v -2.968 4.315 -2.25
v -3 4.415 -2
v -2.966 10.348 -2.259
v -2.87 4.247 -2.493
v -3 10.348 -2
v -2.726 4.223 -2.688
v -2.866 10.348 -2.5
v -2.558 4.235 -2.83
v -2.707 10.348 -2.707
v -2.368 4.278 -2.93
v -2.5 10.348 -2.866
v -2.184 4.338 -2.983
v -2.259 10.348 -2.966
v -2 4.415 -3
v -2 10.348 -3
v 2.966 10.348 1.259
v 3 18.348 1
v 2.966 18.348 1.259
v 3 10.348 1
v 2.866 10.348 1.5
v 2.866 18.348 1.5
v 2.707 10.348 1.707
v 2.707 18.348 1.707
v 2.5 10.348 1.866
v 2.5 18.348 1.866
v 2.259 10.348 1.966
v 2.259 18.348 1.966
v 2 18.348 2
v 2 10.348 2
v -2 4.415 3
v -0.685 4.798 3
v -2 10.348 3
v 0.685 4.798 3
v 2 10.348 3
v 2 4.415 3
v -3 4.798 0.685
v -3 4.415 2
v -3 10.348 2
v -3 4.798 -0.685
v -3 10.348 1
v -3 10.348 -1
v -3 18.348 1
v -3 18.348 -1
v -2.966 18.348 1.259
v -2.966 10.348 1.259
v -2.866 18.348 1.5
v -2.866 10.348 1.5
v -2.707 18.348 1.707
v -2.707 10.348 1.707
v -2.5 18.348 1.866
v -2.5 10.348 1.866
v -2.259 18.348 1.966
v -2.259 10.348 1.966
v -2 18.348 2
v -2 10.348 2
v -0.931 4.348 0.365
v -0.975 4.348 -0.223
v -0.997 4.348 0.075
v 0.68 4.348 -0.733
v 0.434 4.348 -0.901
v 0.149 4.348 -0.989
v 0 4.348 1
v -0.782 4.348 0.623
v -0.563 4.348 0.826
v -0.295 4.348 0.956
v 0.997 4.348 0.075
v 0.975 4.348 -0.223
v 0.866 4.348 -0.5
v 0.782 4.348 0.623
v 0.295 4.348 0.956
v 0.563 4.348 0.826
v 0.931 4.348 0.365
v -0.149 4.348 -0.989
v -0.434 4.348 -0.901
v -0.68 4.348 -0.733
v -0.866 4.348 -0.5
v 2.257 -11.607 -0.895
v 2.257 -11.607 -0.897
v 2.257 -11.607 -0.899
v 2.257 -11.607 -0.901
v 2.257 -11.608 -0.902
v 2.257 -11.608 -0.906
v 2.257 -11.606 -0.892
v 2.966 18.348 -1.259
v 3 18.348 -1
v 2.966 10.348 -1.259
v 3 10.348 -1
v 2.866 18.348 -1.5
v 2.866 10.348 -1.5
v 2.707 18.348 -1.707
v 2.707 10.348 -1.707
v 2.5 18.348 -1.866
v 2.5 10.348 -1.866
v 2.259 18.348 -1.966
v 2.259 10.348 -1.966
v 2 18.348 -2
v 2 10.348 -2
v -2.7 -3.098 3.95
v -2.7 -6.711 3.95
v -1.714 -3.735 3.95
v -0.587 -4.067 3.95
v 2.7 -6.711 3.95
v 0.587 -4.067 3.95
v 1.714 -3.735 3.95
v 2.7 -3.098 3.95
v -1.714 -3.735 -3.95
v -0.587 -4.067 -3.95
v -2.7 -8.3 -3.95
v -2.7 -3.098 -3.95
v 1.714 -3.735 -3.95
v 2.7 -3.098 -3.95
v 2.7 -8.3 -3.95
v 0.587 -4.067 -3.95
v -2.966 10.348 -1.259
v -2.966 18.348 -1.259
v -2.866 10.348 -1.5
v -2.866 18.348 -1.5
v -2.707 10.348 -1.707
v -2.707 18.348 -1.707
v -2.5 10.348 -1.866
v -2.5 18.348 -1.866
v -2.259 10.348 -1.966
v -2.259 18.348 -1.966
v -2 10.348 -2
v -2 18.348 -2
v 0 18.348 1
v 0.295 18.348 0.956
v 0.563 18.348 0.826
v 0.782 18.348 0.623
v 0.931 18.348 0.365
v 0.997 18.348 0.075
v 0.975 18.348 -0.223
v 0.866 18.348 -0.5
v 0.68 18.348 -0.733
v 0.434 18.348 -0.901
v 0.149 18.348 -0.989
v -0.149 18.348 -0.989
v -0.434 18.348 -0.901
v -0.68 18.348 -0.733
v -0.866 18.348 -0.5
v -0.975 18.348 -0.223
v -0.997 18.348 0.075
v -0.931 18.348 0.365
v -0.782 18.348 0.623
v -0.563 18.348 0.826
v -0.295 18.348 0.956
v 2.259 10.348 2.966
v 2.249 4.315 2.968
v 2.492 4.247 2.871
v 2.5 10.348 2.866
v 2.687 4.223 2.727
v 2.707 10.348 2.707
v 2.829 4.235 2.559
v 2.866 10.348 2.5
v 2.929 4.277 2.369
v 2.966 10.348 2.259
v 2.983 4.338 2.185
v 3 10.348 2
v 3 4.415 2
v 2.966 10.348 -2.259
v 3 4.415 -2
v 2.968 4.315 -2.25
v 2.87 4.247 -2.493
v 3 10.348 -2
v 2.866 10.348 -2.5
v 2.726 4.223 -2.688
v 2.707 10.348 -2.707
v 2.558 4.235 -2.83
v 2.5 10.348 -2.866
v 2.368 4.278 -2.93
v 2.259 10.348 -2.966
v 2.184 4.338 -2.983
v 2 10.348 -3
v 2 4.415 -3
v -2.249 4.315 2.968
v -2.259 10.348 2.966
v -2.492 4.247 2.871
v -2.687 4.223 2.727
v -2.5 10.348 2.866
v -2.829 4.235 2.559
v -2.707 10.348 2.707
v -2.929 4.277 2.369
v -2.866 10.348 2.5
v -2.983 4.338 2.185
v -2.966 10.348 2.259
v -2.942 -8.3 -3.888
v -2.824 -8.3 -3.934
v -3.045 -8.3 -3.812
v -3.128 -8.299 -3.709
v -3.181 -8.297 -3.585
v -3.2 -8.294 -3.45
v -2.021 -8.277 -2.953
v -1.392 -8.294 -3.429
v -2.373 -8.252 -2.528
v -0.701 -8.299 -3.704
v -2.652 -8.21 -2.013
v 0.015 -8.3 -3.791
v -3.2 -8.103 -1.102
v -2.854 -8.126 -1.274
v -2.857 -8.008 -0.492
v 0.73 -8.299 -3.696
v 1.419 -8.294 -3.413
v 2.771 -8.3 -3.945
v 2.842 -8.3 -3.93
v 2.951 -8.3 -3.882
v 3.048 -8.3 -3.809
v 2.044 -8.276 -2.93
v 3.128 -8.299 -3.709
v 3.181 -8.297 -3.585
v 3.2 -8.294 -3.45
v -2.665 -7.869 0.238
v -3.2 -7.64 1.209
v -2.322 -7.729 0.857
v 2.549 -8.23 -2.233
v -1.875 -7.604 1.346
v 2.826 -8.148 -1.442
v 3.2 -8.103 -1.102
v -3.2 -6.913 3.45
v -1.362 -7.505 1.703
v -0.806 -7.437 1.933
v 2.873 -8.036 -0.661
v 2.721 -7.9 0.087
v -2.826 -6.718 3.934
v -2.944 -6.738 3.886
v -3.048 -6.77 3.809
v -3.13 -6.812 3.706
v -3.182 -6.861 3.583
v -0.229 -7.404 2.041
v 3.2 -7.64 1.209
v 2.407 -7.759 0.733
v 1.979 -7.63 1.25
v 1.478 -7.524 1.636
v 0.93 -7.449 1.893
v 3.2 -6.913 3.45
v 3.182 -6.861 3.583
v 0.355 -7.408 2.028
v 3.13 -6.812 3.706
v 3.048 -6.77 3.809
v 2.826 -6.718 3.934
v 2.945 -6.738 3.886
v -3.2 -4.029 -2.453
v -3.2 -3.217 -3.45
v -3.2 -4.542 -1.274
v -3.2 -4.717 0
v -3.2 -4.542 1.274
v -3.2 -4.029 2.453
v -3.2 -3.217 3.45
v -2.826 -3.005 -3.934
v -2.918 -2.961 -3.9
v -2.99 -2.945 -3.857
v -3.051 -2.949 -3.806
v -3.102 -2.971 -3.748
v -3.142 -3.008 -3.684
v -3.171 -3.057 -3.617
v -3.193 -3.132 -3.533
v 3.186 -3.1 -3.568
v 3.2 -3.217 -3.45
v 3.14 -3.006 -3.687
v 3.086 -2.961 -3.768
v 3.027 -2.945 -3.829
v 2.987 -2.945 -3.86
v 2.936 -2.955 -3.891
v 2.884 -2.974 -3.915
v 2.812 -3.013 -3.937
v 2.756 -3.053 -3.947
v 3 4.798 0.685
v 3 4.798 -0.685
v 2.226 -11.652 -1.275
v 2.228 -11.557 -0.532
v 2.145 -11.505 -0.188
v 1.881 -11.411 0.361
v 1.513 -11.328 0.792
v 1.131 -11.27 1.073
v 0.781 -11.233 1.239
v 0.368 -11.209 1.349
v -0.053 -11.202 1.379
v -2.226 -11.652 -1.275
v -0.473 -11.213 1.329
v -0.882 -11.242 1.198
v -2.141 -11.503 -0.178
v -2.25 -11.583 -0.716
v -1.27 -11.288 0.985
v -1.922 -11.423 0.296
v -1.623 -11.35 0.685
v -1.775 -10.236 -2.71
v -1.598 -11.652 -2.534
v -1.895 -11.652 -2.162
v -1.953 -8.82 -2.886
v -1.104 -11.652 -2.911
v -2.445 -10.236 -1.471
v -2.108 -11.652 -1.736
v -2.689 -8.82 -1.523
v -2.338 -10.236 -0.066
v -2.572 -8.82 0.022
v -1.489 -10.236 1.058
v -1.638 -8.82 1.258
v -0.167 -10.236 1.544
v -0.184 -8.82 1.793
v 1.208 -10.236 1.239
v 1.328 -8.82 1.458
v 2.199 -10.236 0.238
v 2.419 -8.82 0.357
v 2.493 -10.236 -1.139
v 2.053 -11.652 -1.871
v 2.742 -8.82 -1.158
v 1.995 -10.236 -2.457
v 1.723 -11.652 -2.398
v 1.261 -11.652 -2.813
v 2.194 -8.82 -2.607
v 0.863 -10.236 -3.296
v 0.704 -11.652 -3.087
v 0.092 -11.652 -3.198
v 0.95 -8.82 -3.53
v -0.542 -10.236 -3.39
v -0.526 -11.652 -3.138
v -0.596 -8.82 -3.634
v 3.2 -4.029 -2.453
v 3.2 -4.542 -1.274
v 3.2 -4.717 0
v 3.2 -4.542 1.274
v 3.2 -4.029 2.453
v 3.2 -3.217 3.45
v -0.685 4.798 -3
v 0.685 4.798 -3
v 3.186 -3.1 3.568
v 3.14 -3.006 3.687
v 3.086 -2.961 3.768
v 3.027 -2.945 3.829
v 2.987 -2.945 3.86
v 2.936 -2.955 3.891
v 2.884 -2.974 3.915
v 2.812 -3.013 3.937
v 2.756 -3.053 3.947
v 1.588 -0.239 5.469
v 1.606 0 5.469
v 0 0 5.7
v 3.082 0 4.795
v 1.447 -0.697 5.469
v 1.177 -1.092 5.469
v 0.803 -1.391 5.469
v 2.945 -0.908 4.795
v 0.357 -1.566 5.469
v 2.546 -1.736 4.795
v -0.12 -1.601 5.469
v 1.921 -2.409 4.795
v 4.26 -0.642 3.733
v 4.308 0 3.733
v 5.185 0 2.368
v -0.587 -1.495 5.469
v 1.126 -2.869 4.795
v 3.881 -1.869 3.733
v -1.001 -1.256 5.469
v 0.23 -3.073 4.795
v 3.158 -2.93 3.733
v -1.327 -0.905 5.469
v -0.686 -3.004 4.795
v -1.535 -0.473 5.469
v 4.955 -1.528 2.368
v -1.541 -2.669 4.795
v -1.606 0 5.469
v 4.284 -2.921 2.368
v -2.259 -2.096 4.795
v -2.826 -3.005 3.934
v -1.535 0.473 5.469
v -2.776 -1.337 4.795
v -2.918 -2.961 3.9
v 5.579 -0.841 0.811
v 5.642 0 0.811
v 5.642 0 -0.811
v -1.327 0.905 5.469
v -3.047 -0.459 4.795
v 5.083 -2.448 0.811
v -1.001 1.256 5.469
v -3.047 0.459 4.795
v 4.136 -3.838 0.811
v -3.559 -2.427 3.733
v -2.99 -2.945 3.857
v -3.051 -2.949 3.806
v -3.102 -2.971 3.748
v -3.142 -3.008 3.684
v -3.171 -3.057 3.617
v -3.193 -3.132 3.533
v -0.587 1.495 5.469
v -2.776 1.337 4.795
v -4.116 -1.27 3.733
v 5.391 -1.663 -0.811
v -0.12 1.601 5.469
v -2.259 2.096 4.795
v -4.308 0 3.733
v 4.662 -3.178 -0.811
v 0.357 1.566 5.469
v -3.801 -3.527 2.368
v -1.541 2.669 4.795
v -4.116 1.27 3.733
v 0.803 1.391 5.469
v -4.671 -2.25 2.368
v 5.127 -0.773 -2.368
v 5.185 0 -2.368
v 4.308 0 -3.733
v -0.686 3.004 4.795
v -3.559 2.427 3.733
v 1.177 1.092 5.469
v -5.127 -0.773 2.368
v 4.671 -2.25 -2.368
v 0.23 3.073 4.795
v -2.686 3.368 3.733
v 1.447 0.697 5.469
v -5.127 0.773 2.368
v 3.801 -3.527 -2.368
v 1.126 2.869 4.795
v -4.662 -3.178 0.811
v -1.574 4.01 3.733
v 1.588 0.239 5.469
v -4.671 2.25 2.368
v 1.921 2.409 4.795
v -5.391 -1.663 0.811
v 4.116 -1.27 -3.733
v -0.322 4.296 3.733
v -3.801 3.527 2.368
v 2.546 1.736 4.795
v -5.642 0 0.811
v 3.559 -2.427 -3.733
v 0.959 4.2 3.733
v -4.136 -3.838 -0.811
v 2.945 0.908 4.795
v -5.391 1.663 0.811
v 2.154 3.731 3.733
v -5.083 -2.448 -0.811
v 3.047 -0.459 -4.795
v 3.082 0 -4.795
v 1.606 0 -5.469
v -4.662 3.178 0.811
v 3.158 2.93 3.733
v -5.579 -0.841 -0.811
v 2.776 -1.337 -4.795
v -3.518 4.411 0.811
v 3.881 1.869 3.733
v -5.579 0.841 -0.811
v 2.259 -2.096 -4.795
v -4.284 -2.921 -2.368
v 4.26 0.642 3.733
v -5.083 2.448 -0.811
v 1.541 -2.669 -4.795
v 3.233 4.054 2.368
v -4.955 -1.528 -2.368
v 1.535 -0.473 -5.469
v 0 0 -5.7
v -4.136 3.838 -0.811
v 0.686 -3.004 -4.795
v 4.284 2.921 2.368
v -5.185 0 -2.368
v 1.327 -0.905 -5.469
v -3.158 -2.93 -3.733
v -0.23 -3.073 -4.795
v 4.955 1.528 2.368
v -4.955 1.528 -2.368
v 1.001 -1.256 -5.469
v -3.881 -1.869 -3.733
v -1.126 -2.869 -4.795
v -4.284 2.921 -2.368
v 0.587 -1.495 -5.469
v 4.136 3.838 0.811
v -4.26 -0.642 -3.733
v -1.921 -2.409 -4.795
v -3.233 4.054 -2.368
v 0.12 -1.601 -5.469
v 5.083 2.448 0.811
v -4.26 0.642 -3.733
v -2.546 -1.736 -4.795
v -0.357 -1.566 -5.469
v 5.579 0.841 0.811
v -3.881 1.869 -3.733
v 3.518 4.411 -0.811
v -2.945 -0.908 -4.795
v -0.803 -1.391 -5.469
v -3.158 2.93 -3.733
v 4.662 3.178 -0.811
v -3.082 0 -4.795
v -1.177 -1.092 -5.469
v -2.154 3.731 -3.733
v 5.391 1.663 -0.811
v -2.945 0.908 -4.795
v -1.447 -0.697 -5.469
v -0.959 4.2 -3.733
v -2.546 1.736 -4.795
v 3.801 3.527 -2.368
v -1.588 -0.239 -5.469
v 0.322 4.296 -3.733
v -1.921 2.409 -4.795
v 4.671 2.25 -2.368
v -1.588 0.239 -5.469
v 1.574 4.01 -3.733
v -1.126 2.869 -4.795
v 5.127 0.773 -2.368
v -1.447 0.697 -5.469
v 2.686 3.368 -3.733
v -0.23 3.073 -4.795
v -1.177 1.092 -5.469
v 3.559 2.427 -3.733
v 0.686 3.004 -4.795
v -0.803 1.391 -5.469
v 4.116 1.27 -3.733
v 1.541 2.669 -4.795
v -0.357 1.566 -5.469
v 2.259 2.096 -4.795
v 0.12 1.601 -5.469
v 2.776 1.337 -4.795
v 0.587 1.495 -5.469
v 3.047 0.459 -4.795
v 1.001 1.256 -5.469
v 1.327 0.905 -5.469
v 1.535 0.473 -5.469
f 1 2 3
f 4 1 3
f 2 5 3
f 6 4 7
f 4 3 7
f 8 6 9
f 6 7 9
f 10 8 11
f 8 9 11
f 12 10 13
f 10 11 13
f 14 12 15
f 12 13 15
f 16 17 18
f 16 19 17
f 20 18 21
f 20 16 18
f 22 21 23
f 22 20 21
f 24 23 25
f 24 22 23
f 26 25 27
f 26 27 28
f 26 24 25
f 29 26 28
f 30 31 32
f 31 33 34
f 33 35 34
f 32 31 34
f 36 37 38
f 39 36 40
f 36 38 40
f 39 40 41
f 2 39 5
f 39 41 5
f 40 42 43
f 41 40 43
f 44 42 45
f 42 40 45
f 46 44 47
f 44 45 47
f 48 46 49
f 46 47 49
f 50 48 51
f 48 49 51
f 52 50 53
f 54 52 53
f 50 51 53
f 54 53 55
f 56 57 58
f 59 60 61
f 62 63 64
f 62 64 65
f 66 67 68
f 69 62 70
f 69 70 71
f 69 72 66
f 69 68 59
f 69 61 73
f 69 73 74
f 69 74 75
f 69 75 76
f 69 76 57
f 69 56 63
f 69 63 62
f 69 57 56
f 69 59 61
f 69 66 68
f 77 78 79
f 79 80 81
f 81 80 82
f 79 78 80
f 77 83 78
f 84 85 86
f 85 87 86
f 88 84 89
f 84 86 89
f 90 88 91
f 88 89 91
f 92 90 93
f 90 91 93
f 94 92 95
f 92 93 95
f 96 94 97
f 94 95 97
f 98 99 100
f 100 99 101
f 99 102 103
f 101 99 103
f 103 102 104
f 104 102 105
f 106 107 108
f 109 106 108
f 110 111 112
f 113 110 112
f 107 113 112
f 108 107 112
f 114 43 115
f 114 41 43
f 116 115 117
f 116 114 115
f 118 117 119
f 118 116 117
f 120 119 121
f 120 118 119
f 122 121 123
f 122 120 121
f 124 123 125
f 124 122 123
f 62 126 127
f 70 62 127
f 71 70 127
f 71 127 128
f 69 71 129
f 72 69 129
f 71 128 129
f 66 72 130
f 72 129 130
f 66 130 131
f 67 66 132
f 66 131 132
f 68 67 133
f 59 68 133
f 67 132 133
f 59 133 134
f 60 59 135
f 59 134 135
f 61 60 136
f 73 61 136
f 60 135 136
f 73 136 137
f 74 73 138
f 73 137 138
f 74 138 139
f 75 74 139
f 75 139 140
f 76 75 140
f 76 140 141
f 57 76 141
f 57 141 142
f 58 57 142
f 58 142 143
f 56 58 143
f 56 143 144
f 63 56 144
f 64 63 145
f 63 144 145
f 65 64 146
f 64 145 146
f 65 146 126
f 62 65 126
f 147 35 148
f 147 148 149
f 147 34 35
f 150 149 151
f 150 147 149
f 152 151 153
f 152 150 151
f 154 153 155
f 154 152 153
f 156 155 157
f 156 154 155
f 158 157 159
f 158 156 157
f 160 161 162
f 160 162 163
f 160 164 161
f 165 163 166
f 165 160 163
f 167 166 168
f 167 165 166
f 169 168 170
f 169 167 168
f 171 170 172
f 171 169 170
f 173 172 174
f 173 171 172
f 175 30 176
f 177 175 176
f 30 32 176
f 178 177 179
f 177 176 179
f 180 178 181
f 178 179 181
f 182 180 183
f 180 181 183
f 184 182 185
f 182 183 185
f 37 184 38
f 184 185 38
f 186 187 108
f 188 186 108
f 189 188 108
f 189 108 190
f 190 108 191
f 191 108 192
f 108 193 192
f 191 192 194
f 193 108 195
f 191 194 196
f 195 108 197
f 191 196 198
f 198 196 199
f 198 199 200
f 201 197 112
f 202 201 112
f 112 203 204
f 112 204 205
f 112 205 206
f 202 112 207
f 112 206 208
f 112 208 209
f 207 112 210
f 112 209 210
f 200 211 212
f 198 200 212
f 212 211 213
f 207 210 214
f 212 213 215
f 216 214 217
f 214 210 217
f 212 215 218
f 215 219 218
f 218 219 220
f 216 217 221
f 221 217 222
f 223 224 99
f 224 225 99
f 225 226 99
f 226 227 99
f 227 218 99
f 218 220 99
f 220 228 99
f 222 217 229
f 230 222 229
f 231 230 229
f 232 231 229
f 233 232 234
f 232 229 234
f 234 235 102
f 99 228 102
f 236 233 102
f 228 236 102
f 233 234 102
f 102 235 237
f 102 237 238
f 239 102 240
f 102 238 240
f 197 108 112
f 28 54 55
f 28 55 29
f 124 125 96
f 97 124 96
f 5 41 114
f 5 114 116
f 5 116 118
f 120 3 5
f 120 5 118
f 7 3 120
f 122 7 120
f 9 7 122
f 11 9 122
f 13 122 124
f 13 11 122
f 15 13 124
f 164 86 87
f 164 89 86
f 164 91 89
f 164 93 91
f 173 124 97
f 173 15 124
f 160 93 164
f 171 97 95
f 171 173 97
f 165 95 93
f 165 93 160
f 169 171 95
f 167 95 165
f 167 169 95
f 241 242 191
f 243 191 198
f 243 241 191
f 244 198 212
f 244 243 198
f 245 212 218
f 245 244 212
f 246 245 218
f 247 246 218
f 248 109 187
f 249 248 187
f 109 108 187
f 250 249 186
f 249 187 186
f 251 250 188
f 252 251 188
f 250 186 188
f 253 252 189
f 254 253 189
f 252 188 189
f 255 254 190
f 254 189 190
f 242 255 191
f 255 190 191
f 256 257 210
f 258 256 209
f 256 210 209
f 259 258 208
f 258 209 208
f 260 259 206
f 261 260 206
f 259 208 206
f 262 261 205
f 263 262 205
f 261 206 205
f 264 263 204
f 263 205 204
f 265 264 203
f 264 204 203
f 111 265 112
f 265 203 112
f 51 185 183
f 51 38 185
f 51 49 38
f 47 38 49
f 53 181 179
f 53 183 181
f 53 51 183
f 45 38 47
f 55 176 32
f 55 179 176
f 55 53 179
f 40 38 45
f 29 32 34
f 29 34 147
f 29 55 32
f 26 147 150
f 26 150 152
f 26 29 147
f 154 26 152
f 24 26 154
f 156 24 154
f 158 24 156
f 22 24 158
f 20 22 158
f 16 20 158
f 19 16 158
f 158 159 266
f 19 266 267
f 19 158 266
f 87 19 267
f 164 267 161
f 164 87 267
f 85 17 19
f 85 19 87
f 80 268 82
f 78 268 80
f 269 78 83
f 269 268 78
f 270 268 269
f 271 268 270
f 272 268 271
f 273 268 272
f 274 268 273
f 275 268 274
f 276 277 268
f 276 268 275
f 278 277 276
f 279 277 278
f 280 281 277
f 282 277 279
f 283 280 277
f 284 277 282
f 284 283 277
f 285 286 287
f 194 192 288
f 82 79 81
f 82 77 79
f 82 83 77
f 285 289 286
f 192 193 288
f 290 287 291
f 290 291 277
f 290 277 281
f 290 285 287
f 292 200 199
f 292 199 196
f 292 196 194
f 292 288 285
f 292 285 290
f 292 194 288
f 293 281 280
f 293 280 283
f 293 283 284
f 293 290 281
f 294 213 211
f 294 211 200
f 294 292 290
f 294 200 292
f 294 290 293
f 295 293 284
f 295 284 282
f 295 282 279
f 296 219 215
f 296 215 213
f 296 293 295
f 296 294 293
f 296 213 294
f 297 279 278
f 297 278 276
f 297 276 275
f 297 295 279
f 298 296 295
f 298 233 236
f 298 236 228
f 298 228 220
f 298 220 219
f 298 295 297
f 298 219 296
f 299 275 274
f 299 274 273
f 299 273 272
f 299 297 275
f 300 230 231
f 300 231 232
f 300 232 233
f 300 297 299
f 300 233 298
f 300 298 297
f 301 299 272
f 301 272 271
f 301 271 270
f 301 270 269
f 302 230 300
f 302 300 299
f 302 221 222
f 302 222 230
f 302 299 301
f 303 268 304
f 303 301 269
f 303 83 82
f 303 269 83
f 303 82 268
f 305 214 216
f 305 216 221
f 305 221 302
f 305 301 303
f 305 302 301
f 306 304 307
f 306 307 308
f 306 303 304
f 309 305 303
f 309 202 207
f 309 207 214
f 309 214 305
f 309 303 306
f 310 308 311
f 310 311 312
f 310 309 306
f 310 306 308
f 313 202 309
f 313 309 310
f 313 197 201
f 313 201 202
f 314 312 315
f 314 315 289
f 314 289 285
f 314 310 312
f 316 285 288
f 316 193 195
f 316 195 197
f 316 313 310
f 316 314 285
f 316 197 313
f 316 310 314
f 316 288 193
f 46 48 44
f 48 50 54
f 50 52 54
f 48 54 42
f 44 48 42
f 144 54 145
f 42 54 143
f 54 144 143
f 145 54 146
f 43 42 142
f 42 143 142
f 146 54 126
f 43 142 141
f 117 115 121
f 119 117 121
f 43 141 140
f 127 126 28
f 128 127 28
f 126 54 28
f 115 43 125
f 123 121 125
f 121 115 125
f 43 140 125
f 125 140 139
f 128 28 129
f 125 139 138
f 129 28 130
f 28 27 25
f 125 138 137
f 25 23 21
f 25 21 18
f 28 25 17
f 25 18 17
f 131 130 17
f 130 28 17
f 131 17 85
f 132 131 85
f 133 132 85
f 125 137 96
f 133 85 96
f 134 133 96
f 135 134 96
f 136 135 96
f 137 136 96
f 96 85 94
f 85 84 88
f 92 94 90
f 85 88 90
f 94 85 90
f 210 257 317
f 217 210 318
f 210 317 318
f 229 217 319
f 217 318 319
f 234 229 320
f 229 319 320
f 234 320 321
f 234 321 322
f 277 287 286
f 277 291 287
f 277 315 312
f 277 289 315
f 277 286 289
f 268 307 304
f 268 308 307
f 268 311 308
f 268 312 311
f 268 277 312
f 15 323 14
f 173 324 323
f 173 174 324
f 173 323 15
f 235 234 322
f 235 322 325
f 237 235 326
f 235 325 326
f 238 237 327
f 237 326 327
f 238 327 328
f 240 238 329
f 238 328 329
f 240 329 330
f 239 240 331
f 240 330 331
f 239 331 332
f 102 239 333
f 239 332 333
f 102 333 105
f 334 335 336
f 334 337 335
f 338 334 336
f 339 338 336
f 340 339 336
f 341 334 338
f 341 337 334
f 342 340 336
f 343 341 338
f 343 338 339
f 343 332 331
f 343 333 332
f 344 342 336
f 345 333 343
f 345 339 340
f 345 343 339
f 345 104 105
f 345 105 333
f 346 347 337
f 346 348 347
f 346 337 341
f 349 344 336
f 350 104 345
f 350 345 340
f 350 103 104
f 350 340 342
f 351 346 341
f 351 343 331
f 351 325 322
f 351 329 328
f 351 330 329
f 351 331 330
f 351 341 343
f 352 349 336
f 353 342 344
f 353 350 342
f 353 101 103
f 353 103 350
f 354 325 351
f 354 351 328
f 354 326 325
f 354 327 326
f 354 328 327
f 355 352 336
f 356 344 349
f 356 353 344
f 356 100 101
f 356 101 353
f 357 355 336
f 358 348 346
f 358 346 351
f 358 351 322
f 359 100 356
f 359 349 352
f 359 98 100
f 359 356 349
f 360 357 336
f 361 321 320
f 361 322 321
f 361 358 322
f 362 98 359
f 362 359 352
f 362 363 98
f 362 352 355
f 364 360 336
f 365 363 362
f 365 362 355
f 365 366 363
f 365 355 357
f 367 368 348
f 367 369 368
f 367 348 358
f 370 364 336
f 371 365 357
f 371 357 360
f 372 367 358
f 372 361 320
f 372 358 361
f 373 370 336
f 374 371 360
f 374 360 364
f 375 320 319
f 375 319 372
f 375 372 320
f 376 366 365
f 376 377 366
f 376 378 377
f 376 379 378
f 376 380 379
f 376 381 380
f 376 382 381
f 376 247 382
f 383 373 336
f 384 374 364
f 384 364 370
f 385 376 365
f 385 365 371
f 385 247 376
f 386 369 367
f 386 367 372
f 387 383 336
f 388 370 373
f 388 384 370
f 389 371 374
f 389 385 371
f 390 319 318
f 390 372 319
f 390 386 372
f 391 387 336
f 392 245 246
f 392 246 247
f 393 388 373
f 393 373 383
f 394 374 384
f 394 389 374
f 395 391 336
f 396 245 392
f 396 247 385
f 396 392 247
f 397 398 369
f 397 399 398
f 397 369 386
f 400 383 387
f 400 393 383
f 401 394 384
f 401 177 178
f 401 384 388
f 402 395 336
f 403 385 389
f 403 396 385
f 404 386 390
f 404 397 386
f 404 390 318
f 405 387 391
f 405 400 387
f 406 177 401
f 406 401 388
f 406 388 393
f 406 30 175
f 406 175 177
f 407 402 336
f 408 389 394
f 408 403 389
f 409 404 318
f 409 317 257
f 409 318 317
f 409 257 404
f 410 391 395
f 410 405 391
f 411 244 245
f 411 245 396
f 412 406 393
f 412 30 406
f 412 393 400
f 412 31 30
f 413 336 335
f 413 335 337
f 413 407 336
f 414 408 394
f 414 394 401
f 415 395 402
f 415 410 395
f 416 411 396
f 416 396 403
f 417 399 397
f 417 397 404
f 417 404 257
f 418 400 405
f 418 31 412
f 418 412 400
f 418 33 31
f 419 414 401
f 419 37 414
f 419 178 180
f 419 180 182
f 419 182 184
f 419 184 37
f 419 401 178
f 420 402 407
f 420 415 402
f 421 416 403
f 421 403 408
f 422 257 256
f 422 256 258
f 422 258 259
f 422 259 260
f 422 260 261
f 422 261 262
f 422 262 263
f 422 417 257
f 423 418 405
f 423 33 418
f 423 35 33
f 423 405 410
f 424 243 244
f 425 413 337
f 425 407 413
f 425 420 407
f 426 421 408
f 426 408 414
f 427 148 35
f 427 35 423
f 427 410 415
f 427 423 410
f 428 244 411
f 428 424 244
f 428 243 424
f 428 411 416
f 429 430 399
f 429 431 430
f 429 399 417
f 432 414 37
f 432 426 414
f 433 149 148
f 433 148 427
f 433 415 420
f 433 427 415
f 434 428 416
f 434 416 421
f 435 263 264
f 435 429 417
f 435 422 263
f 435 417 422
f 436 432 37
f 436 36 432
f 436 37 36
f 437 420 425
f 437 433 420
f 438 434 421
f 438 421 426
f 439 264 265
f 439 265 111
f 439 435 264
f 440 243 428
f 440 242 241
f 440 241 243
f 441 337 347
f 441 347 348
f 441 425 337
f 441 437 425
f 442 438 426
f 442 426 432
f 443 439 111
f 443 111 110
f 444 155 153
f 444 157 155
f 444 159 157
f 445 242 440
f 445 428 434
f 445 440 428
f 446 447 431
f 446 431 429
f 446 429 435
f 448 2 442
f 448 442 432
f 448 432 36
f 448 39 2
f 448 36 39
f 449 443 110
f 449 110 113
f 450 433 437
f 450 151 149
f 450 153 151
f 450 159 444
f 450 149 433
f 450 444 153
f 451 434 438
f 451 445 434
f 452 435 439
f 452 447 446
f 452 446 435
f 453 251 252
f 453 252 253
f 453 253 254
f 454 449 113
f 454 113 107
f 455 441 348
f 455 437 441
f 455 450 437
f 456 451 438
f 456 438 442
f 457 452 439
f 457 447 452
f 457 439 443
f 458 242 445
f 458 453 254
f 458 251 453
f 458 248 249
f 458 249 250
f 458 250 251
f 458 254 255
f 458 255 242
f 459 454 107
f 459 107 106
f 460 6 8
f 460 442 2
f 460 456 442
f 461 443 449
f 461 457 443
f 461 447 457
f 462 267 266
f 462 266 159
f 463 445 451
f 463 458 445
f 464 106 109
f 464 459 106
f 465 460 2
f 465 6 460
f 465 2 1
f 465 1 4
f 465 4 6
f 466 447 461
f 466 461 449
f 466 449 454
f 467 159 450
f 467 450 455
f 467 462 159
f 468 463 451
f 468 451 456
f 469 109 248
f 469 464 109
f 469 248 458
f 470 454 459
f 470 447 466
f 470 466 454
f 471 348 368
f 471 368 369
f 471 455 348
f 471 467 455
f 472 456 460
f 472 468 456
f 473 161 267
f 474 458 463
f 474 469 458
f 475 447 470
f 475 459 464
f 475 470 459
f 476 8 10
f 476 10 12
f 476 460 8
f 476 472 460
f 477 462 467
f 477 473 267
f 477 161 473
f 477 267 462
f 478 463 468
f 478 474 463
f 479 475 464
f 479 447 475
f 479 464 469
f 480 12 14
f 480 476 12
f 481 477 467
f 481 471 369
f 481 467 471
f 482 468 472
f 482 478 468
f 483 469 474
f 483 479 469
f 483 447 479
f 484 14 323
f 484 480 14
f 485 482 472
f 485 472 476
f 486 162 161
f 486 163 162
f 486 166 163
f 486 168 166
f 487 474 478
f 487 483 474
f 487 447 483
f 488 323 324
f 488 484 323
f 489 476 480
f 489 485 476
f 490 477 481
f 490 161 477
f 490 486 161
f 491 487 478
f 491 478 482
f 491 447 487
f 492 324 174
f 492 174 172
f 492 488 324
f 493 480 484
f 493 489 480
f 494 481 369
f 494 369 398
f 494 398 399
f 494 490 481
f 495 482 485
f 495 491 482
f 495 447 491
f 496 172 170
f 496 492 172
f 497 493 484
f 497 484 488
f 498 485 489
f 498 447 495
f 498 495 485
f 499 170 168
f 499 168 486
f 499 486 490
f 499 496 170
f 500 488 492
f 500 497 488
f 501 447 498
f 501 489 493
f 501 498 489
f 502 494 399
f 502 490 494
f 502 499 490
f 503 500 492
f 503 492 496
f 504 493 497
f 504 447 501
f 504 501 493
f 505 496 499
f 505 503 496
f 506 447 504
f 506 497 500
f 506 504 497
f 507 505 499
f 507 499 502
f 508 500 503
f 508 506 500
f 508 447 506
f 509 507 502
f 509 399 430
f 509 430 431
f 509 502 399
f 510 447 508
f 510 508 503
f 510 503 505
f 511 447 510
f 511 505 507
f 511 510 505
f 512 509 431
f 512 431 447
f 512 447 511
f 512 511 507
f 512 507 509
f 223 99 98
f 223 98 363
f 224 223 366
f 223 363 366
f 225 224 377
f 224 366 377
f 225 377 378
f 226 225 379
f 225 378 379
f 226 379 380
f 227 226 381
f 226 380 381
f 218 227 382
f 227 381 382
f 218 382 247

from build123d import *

# Parameters (mm, degrees)
BOSS_EXTRUDE1_DEPTH = 3.2
CUT_EXTRUDE1_START  = -2.25739
CUT_EXTRUDE1_DEPTH  = 4.51476888
SKETCH6_W           = 6
SKETCH6_H           = 16.9095993
BOSS_EXTRUDE2_DEPTH = 3
SKETCH7_OUTSIDE_W   = 20.212
SKETCH7_OUTSIDE_H   = 20.212
SKETCH7_OUTSIDE_W_2 = 6
SKETCH7_OUTSIDE_H_2 = 4
CUT_EXTRUDE2_DEPTH  = 8
FILLET1_R           = 1
FILLET2_R           = 0.5
SKETCH8_R           = 1
CUT_EXTRUDE3_DEPTH  = 14


# Read off the part's stored shape, not the designer's step: Cut-Extrude1
with BuildPart() as part:
    # Sketch1 → Revolve1 (revolve)
    with BuildSketch(Plane(origin=(0, 0, 0), x_dir=(1, 0, 0), z_dir=(0, 1, 0))):
        with BuildLine():
            Line((0, 5.7), (0, -5.7))
            ThreePointArc((0, -5.7), (5.7, 0), (0, 5.7))
        make_face()
    revolve(axis=Axis((0, 0, 14.54011976), (0, 0, -1)))

    # Sketch2 → Boss-Extrude1 (add, symmetric)
    with BuildSketch(Plane(origin=(0, 0, 0), x_dir=(0, 0, -1), z_dir=(1, 0, 0))):
        with BuildLine():
            Line((-3.95, 0), (3.95, 0))
            Line((3.95, 0), (3.95, -8.3))
            ThreePointArc((3.95, -8.3), (-0.079654203, -7.901360118), (-3.95, -6.710792959))
            Line((-3.95, -6.710792959), (-3.95, 0))
        make_face()
    extrude(amount=BOSS_EXTRUDE1_DEPTH, both=True)

    # Sketch3 → Revolve2 (revolve)
    with BuildSketch(Plane(origin=(0, 0, 0), x_dir=(0, 0, -1), z_dir=(1, 0, 0)), mode=Mode.PRIVATE) as revolve2_sk:
        Polygon((0.95, -7.401163559), (0.95, -11.652192734), (3.2, -11.652192734), (3.95, -7.401163559), align=None)
    revolve(revolve2_sk.sketch.rotate(Axis((0, -11.652192734, -0.95), (0, 1, 0)), 45.250719205), axis=Axis((0, -11.652192734, -0.95), (0, 1, 0)))

    # Cut-Extrude1 outline → Cut-Extrude1 (cut)
    with BuildSketch(Plane(origin=(0, 0, 0), x_dir=(0, 0, -1), z_dir=(1, 0, 0)).offset(CUT_EXTRUDE1_START)):
        with BuildLine():
            Line((-3, -11.652192734), (1.275092895, -11.652192734))
            ThreePointArc((1.275092895, -11.652192734), (-0.058768815, -11.464467118), (-1.379872872, -11.201575434))
            Line((-1.379872872, -11.201575434), (-3, -10.831225258))
            Line((-3, -10.831225258), (-3, -11.652192734))
        make_face()
    extrude(amount=CUT_EXTRUDE1_DEPTH, mode=Mode.SUBTRACT)

    # Sketch6 → Boss-Extrude2 (add, symmetric)
    with BuildSketch(Plane(origin=(0, 0, 0), x_dir=(0, 0, -1), z_dir=(1, 0, 0))):
        with Locations((0, 9.893007616)):
            Rectangle(SKETCH6_W, SKETCH6_H)
    extrude(amount=BOSS_EXTRUDE2_DEPTH, both=True)

    # Sketch7 outside → Cut-Extrude2 (cut)
    with BuildSketch(Plane(origin=(0, 18.347807266, 0), x_dir=(1, 0, 0), z_dir=(0, 1, 0))):
        Rectangle(SKETCH7_OUTSIDE_W, SKETCH7_OUTSIDE_H)
        Rectangle(SKETCH7_OUTSIDE_W_2, SKETCH7_OUTSIDE_H_2, mode=Mode.SUBTRACT)
    extrude(amount=-CUT_EXTRUDE2_DEPTH, mode=Mode.SUBTRACT)

    # Fillet1
    fillet1_edges = [part.edges().sort_by_distance(p)[0] for p in [
        (-3, 7.077190264, 3),
        (3, 7.077190264, 3),
        (-3, 7.077190264, -3),
        (3, 7.077190264, -3),
        (-3, 14.347807266, -2),
        (-3, 14.347807266, 2),
        (3, 14.347807266, -2),
        (3, 14.347807266, 2),
    ]]
    fillet(fillet1_edges, radius=FILLET1_R)

    # Fillet2
    fillet2_edges = [part.edges().sort_by_distance(p)[0] for p in [
        (-3.2, -4.644533788, 3.95),
        (3.2, -4.644533788, 3.95),
        (3.2, -5.439137308, -3.95),
        (-3.2, -5.439137308, -3.95),
    ]]
    fillet(fillet2_edges, radius=FILLET2_R)

    # Sketch8 → Cut-Extrude3 (cut)
    with BuildSketch(Plane(origin=(0, 18.347807266, 0), x_dir=(1, 0, 0), z_dir=(0, 1, 0))):
        with Locations(Location((0, 0, 0), (0, 0, 270))):
            Circle(SKETCH8_R)
    extrude(amount=-CUT_EXTRUDE3_DEPTH, mode=Mode.SUBTRACT)


solid = part.part
